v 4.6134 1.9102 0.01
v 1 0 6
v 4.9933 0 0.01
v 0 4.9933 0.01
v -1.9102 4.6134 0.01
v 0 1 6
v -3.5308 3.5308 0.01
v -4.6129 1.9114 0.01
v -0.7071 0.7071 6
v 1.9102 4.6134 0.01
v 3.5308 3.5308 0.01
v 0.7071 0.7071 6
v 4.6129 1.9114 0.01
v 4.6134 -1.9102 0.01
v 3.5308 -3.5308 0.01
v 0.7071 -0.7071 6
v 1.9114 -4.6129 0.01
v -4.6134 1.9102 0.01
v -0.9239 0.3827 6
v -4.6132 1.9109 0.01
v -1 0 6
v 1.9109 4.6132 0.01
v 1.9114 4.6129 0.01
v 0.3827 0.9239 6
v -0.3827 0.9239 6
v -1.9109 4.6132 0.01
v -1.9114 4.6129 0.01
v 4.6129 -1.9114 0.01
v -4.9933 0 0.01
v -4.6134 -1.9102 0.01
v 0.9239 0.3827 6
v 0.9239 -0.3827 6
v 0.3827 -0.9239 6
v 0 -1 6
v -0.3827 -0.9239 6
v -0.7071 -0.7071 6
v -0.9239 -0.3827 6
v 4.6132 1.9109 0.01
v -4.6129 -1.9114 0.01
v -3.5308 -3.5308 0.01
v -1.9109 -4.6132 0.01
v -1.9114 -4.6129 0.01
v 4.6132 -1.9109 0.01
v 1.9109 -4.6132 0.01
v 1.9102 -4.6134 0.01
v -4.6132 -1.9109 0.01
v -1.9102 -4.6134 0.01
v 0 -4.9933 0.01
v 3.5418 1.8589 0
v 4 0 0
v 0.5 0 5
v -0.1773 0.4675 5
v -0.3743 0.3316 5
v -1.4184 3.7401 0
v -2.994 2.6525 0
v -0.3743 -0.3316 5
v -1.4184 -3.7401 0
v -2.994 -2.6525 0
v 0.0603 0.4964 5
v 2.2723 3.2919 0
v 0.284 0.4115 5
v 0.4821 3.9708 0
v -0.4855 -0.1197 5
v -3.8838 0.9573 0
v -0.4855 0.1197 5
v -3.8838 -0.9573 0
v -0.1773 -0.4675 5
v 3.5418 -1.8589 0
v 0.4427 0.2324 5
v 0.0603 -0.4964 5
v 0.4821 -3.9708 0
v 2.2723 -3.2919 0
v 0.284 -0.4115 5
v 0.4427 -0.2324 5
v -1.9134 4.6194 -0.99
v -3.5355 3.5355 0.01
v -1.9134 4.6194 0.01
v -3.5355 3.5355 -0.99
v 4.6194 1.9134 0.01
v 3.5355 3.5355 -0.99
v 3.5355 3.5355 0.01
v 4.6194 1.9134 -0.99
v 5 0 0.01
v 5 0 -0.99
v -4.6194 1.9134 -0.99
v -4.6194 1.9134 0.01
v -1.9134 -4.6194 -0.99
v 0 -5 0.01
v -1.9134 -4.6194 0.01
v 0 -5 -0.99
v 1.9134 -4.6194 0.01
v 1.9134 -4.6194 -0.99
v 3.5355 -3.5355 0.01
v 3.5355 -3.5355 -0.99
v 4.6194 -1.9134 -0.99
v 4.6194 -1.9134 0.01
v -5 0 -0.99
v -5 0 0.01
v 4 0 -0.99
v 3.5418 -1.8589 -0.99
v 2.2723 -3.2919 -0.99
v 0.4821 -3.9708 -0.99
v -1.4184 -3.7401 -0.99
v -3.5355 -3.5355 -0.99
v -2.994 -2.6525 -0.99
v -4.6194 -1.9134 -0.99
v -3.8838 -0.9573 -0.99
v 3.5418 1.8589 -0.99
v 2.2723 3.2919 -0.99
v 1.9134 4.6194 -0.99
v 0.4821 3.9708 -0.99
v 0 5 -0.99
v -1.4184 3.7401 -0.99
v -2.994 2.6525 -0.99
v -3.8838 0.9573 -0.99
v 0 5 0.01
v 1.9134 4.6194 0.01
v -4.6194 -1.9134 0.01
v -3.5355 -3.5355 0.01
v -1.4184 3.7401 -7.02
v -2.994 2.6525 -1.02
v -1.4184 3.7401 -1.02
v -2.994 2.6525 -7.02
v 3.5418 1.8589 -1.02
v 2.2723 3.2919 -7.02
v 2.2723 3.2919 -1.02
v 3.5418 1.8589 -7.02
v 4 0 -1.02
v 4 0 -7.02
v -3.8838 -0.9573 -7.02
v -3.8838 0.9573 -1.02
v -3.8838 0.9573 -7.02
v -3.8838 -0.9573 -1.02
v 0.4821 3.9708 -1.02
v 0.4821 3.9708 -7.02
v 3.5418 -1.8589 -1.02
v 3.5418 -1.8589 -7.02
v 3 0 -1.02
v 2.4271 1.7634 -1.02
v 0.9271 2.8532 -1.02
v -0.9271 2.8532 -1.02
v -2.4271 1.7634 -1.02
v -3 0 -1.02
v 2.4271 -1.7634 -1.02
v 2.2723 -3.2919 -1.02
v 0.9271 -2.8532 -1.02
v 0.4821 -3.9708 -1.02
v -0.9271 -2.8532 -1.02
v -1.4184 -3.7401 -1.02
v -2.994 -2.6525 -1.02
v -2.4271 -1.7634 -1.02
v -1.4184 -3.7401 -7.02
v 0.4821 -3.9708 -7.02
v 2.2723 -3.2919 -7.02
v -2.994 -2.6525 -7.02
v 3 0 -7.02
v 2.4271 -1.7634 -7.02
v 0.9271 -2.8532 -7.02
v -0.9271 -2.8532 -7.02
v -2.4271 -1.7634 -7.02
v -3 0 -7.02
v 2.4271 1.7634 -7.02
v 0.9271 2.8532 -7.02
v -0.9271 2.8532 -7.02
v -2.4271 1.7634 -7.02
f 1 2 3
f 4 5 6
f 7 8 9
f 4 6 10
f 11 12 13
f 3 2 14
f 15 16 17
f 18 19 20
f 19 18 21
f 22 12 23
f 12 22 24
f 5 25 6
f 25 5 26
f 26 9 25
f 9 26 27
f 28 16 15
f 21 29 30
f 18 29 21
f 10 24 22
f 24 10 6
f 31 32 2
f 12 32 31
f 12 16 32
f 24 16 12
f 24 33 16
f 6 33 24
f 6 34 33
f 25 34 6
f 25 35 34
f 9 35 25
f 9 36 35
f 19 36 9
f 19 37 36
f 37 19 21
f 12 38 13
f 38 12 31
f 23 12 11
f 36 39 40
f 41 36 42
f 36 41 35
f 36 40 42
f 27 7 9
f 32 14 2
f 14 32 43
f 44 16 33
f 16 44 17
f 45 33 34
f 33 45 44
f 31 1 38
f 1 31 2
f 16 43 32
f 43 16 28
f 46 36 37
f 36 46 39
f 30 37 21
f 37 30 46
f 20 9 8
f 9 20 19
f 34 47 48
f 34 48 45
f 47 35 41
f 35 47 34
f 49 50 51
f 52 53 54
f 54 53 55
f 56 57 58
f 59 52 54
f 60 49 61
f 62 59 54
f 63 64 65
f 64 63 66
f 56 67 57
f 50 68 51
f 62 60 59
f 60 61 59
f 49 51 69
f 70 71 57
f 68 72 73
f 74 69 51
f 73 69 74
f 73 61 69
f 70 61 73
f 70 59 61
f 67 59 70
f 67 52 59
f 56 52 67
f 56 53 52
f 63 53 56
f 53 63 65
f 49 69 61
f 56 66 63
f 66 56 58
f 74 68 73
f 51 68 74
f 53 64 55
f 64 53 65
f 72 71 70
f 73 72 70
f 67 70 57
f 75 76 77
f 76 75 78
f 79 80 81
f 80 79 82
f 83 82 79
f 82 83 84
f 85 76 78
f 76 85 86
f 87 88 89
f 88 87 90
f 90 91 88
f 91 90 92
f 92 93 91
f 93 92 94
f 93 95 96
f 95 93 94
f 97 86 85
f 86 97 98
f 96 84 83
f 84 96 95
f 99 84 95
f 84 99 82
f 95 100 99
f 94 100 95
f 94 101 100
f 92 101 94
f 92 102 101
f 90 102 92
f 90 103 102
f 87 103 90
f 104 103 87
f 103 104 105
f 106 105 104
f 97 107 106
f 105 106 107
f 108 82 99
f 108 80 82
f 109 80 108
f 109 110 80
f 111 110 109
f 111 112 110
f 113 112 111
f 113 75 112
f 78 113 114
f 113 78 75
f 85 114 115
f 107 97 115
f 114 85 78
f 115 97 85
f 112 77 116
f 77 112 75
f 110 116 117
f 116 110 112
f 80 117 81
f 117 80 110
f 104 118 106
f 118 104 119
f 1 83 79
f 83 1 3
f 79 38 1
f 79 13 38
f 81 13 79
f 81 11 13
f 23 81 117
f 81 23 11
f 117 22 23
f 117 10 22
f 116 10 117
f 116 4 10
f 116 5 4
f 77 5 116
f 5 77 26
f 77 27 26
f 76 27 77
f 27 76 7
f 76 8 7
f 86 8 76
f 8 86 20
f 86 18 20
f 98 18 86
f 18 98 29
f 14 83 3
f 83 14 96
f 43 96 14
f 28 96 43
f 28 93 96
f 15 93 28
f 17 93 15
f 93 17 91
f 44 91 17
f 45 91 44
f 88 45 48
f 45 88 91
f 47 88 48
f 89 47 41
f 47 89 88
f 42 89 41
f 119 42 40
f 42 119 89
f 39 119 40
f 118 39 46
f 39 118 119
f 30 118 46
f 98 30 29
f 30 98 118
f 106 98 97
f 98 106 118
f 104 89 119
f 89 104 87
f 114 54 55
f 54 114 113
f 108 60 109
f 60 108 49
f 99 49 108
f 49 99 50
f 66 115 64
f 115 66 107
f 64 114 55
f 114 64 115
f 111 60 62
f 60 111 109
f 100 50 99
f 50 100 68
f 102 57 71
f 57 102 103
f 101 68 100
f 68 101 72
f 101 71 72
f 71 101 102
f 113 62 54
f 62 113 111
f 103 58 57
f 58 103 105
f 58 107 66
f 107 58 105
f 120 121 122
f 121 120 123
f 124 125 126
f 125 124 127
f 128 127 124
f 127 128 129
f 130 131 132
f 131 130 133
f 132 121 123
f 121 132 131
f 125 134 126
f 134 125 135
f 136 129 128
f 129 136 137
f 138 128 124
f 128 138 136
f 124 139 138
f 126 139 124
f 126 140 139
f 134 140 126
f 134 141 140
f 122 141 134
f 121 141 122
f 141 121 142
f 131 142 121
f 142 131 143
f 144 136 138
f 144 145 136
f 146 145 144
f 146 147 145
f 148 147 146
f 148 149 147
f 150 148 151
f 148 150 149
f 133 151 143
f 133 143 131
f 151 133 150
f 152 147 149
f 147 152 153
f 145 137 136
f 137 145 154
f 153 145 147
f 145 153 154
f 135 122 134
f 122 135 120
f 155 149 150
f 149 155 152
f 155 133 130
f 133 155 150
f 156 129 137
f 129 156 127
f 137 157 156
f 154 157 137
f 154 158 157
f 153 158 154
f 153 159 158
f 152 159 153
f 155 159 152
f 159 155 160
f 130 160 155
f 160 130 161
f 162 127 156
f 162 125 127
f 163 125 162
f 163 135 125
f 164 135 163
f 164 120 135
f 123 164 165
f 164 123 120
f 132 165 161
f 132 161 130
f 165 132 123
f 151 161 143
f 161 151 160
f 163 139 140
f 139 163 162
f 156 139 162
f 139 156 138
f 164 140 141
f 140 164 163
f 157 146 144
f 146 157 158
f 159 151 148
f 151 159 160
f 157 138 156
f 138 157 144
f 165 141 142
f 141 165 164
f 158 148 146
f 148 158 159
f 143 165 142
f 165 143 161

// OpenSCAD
// An attempt to generate a lamp design to be used
// with the BESK scale model
//
$fa = 3;

// top cone
cone_h=6;
cone_bot_r=5;
cone_top_r=1;
// attachment disc
disc_h=1;
disc_r=5;
// bottom cylinder "tube"
cyl_h=6;
cyl_r=4;

thickness=1;  // 1 mm material
eps=0.01;     // alternative?

union() {
    difference() {  // top cone
	cylinder(cone_h,    cone_bot_r, cone_top_r);
	cylinder(cone_h-thickness,  cone_bot_r-thickness, cone_top_r-0.5);
    }
    translate([0,0,-(disc_h-eps)])
	difference() { // disc cylinder
	cylinder(disc_h, cone_bot_r, cone_bot_r);
	cylinder(disc_h, cone_bot_r-thickness, cone_bot_r-thickness);
    }
    translate([0,0,-(disc_h+cyl_h+2*eps)])
    difference() { // attaching "tube"
	cylinder(cyl_h, cyl_r, cyl_r);
	cylinder(cyl_h, cyl_r-thickness, cyl_r-thickness);
    }
}
